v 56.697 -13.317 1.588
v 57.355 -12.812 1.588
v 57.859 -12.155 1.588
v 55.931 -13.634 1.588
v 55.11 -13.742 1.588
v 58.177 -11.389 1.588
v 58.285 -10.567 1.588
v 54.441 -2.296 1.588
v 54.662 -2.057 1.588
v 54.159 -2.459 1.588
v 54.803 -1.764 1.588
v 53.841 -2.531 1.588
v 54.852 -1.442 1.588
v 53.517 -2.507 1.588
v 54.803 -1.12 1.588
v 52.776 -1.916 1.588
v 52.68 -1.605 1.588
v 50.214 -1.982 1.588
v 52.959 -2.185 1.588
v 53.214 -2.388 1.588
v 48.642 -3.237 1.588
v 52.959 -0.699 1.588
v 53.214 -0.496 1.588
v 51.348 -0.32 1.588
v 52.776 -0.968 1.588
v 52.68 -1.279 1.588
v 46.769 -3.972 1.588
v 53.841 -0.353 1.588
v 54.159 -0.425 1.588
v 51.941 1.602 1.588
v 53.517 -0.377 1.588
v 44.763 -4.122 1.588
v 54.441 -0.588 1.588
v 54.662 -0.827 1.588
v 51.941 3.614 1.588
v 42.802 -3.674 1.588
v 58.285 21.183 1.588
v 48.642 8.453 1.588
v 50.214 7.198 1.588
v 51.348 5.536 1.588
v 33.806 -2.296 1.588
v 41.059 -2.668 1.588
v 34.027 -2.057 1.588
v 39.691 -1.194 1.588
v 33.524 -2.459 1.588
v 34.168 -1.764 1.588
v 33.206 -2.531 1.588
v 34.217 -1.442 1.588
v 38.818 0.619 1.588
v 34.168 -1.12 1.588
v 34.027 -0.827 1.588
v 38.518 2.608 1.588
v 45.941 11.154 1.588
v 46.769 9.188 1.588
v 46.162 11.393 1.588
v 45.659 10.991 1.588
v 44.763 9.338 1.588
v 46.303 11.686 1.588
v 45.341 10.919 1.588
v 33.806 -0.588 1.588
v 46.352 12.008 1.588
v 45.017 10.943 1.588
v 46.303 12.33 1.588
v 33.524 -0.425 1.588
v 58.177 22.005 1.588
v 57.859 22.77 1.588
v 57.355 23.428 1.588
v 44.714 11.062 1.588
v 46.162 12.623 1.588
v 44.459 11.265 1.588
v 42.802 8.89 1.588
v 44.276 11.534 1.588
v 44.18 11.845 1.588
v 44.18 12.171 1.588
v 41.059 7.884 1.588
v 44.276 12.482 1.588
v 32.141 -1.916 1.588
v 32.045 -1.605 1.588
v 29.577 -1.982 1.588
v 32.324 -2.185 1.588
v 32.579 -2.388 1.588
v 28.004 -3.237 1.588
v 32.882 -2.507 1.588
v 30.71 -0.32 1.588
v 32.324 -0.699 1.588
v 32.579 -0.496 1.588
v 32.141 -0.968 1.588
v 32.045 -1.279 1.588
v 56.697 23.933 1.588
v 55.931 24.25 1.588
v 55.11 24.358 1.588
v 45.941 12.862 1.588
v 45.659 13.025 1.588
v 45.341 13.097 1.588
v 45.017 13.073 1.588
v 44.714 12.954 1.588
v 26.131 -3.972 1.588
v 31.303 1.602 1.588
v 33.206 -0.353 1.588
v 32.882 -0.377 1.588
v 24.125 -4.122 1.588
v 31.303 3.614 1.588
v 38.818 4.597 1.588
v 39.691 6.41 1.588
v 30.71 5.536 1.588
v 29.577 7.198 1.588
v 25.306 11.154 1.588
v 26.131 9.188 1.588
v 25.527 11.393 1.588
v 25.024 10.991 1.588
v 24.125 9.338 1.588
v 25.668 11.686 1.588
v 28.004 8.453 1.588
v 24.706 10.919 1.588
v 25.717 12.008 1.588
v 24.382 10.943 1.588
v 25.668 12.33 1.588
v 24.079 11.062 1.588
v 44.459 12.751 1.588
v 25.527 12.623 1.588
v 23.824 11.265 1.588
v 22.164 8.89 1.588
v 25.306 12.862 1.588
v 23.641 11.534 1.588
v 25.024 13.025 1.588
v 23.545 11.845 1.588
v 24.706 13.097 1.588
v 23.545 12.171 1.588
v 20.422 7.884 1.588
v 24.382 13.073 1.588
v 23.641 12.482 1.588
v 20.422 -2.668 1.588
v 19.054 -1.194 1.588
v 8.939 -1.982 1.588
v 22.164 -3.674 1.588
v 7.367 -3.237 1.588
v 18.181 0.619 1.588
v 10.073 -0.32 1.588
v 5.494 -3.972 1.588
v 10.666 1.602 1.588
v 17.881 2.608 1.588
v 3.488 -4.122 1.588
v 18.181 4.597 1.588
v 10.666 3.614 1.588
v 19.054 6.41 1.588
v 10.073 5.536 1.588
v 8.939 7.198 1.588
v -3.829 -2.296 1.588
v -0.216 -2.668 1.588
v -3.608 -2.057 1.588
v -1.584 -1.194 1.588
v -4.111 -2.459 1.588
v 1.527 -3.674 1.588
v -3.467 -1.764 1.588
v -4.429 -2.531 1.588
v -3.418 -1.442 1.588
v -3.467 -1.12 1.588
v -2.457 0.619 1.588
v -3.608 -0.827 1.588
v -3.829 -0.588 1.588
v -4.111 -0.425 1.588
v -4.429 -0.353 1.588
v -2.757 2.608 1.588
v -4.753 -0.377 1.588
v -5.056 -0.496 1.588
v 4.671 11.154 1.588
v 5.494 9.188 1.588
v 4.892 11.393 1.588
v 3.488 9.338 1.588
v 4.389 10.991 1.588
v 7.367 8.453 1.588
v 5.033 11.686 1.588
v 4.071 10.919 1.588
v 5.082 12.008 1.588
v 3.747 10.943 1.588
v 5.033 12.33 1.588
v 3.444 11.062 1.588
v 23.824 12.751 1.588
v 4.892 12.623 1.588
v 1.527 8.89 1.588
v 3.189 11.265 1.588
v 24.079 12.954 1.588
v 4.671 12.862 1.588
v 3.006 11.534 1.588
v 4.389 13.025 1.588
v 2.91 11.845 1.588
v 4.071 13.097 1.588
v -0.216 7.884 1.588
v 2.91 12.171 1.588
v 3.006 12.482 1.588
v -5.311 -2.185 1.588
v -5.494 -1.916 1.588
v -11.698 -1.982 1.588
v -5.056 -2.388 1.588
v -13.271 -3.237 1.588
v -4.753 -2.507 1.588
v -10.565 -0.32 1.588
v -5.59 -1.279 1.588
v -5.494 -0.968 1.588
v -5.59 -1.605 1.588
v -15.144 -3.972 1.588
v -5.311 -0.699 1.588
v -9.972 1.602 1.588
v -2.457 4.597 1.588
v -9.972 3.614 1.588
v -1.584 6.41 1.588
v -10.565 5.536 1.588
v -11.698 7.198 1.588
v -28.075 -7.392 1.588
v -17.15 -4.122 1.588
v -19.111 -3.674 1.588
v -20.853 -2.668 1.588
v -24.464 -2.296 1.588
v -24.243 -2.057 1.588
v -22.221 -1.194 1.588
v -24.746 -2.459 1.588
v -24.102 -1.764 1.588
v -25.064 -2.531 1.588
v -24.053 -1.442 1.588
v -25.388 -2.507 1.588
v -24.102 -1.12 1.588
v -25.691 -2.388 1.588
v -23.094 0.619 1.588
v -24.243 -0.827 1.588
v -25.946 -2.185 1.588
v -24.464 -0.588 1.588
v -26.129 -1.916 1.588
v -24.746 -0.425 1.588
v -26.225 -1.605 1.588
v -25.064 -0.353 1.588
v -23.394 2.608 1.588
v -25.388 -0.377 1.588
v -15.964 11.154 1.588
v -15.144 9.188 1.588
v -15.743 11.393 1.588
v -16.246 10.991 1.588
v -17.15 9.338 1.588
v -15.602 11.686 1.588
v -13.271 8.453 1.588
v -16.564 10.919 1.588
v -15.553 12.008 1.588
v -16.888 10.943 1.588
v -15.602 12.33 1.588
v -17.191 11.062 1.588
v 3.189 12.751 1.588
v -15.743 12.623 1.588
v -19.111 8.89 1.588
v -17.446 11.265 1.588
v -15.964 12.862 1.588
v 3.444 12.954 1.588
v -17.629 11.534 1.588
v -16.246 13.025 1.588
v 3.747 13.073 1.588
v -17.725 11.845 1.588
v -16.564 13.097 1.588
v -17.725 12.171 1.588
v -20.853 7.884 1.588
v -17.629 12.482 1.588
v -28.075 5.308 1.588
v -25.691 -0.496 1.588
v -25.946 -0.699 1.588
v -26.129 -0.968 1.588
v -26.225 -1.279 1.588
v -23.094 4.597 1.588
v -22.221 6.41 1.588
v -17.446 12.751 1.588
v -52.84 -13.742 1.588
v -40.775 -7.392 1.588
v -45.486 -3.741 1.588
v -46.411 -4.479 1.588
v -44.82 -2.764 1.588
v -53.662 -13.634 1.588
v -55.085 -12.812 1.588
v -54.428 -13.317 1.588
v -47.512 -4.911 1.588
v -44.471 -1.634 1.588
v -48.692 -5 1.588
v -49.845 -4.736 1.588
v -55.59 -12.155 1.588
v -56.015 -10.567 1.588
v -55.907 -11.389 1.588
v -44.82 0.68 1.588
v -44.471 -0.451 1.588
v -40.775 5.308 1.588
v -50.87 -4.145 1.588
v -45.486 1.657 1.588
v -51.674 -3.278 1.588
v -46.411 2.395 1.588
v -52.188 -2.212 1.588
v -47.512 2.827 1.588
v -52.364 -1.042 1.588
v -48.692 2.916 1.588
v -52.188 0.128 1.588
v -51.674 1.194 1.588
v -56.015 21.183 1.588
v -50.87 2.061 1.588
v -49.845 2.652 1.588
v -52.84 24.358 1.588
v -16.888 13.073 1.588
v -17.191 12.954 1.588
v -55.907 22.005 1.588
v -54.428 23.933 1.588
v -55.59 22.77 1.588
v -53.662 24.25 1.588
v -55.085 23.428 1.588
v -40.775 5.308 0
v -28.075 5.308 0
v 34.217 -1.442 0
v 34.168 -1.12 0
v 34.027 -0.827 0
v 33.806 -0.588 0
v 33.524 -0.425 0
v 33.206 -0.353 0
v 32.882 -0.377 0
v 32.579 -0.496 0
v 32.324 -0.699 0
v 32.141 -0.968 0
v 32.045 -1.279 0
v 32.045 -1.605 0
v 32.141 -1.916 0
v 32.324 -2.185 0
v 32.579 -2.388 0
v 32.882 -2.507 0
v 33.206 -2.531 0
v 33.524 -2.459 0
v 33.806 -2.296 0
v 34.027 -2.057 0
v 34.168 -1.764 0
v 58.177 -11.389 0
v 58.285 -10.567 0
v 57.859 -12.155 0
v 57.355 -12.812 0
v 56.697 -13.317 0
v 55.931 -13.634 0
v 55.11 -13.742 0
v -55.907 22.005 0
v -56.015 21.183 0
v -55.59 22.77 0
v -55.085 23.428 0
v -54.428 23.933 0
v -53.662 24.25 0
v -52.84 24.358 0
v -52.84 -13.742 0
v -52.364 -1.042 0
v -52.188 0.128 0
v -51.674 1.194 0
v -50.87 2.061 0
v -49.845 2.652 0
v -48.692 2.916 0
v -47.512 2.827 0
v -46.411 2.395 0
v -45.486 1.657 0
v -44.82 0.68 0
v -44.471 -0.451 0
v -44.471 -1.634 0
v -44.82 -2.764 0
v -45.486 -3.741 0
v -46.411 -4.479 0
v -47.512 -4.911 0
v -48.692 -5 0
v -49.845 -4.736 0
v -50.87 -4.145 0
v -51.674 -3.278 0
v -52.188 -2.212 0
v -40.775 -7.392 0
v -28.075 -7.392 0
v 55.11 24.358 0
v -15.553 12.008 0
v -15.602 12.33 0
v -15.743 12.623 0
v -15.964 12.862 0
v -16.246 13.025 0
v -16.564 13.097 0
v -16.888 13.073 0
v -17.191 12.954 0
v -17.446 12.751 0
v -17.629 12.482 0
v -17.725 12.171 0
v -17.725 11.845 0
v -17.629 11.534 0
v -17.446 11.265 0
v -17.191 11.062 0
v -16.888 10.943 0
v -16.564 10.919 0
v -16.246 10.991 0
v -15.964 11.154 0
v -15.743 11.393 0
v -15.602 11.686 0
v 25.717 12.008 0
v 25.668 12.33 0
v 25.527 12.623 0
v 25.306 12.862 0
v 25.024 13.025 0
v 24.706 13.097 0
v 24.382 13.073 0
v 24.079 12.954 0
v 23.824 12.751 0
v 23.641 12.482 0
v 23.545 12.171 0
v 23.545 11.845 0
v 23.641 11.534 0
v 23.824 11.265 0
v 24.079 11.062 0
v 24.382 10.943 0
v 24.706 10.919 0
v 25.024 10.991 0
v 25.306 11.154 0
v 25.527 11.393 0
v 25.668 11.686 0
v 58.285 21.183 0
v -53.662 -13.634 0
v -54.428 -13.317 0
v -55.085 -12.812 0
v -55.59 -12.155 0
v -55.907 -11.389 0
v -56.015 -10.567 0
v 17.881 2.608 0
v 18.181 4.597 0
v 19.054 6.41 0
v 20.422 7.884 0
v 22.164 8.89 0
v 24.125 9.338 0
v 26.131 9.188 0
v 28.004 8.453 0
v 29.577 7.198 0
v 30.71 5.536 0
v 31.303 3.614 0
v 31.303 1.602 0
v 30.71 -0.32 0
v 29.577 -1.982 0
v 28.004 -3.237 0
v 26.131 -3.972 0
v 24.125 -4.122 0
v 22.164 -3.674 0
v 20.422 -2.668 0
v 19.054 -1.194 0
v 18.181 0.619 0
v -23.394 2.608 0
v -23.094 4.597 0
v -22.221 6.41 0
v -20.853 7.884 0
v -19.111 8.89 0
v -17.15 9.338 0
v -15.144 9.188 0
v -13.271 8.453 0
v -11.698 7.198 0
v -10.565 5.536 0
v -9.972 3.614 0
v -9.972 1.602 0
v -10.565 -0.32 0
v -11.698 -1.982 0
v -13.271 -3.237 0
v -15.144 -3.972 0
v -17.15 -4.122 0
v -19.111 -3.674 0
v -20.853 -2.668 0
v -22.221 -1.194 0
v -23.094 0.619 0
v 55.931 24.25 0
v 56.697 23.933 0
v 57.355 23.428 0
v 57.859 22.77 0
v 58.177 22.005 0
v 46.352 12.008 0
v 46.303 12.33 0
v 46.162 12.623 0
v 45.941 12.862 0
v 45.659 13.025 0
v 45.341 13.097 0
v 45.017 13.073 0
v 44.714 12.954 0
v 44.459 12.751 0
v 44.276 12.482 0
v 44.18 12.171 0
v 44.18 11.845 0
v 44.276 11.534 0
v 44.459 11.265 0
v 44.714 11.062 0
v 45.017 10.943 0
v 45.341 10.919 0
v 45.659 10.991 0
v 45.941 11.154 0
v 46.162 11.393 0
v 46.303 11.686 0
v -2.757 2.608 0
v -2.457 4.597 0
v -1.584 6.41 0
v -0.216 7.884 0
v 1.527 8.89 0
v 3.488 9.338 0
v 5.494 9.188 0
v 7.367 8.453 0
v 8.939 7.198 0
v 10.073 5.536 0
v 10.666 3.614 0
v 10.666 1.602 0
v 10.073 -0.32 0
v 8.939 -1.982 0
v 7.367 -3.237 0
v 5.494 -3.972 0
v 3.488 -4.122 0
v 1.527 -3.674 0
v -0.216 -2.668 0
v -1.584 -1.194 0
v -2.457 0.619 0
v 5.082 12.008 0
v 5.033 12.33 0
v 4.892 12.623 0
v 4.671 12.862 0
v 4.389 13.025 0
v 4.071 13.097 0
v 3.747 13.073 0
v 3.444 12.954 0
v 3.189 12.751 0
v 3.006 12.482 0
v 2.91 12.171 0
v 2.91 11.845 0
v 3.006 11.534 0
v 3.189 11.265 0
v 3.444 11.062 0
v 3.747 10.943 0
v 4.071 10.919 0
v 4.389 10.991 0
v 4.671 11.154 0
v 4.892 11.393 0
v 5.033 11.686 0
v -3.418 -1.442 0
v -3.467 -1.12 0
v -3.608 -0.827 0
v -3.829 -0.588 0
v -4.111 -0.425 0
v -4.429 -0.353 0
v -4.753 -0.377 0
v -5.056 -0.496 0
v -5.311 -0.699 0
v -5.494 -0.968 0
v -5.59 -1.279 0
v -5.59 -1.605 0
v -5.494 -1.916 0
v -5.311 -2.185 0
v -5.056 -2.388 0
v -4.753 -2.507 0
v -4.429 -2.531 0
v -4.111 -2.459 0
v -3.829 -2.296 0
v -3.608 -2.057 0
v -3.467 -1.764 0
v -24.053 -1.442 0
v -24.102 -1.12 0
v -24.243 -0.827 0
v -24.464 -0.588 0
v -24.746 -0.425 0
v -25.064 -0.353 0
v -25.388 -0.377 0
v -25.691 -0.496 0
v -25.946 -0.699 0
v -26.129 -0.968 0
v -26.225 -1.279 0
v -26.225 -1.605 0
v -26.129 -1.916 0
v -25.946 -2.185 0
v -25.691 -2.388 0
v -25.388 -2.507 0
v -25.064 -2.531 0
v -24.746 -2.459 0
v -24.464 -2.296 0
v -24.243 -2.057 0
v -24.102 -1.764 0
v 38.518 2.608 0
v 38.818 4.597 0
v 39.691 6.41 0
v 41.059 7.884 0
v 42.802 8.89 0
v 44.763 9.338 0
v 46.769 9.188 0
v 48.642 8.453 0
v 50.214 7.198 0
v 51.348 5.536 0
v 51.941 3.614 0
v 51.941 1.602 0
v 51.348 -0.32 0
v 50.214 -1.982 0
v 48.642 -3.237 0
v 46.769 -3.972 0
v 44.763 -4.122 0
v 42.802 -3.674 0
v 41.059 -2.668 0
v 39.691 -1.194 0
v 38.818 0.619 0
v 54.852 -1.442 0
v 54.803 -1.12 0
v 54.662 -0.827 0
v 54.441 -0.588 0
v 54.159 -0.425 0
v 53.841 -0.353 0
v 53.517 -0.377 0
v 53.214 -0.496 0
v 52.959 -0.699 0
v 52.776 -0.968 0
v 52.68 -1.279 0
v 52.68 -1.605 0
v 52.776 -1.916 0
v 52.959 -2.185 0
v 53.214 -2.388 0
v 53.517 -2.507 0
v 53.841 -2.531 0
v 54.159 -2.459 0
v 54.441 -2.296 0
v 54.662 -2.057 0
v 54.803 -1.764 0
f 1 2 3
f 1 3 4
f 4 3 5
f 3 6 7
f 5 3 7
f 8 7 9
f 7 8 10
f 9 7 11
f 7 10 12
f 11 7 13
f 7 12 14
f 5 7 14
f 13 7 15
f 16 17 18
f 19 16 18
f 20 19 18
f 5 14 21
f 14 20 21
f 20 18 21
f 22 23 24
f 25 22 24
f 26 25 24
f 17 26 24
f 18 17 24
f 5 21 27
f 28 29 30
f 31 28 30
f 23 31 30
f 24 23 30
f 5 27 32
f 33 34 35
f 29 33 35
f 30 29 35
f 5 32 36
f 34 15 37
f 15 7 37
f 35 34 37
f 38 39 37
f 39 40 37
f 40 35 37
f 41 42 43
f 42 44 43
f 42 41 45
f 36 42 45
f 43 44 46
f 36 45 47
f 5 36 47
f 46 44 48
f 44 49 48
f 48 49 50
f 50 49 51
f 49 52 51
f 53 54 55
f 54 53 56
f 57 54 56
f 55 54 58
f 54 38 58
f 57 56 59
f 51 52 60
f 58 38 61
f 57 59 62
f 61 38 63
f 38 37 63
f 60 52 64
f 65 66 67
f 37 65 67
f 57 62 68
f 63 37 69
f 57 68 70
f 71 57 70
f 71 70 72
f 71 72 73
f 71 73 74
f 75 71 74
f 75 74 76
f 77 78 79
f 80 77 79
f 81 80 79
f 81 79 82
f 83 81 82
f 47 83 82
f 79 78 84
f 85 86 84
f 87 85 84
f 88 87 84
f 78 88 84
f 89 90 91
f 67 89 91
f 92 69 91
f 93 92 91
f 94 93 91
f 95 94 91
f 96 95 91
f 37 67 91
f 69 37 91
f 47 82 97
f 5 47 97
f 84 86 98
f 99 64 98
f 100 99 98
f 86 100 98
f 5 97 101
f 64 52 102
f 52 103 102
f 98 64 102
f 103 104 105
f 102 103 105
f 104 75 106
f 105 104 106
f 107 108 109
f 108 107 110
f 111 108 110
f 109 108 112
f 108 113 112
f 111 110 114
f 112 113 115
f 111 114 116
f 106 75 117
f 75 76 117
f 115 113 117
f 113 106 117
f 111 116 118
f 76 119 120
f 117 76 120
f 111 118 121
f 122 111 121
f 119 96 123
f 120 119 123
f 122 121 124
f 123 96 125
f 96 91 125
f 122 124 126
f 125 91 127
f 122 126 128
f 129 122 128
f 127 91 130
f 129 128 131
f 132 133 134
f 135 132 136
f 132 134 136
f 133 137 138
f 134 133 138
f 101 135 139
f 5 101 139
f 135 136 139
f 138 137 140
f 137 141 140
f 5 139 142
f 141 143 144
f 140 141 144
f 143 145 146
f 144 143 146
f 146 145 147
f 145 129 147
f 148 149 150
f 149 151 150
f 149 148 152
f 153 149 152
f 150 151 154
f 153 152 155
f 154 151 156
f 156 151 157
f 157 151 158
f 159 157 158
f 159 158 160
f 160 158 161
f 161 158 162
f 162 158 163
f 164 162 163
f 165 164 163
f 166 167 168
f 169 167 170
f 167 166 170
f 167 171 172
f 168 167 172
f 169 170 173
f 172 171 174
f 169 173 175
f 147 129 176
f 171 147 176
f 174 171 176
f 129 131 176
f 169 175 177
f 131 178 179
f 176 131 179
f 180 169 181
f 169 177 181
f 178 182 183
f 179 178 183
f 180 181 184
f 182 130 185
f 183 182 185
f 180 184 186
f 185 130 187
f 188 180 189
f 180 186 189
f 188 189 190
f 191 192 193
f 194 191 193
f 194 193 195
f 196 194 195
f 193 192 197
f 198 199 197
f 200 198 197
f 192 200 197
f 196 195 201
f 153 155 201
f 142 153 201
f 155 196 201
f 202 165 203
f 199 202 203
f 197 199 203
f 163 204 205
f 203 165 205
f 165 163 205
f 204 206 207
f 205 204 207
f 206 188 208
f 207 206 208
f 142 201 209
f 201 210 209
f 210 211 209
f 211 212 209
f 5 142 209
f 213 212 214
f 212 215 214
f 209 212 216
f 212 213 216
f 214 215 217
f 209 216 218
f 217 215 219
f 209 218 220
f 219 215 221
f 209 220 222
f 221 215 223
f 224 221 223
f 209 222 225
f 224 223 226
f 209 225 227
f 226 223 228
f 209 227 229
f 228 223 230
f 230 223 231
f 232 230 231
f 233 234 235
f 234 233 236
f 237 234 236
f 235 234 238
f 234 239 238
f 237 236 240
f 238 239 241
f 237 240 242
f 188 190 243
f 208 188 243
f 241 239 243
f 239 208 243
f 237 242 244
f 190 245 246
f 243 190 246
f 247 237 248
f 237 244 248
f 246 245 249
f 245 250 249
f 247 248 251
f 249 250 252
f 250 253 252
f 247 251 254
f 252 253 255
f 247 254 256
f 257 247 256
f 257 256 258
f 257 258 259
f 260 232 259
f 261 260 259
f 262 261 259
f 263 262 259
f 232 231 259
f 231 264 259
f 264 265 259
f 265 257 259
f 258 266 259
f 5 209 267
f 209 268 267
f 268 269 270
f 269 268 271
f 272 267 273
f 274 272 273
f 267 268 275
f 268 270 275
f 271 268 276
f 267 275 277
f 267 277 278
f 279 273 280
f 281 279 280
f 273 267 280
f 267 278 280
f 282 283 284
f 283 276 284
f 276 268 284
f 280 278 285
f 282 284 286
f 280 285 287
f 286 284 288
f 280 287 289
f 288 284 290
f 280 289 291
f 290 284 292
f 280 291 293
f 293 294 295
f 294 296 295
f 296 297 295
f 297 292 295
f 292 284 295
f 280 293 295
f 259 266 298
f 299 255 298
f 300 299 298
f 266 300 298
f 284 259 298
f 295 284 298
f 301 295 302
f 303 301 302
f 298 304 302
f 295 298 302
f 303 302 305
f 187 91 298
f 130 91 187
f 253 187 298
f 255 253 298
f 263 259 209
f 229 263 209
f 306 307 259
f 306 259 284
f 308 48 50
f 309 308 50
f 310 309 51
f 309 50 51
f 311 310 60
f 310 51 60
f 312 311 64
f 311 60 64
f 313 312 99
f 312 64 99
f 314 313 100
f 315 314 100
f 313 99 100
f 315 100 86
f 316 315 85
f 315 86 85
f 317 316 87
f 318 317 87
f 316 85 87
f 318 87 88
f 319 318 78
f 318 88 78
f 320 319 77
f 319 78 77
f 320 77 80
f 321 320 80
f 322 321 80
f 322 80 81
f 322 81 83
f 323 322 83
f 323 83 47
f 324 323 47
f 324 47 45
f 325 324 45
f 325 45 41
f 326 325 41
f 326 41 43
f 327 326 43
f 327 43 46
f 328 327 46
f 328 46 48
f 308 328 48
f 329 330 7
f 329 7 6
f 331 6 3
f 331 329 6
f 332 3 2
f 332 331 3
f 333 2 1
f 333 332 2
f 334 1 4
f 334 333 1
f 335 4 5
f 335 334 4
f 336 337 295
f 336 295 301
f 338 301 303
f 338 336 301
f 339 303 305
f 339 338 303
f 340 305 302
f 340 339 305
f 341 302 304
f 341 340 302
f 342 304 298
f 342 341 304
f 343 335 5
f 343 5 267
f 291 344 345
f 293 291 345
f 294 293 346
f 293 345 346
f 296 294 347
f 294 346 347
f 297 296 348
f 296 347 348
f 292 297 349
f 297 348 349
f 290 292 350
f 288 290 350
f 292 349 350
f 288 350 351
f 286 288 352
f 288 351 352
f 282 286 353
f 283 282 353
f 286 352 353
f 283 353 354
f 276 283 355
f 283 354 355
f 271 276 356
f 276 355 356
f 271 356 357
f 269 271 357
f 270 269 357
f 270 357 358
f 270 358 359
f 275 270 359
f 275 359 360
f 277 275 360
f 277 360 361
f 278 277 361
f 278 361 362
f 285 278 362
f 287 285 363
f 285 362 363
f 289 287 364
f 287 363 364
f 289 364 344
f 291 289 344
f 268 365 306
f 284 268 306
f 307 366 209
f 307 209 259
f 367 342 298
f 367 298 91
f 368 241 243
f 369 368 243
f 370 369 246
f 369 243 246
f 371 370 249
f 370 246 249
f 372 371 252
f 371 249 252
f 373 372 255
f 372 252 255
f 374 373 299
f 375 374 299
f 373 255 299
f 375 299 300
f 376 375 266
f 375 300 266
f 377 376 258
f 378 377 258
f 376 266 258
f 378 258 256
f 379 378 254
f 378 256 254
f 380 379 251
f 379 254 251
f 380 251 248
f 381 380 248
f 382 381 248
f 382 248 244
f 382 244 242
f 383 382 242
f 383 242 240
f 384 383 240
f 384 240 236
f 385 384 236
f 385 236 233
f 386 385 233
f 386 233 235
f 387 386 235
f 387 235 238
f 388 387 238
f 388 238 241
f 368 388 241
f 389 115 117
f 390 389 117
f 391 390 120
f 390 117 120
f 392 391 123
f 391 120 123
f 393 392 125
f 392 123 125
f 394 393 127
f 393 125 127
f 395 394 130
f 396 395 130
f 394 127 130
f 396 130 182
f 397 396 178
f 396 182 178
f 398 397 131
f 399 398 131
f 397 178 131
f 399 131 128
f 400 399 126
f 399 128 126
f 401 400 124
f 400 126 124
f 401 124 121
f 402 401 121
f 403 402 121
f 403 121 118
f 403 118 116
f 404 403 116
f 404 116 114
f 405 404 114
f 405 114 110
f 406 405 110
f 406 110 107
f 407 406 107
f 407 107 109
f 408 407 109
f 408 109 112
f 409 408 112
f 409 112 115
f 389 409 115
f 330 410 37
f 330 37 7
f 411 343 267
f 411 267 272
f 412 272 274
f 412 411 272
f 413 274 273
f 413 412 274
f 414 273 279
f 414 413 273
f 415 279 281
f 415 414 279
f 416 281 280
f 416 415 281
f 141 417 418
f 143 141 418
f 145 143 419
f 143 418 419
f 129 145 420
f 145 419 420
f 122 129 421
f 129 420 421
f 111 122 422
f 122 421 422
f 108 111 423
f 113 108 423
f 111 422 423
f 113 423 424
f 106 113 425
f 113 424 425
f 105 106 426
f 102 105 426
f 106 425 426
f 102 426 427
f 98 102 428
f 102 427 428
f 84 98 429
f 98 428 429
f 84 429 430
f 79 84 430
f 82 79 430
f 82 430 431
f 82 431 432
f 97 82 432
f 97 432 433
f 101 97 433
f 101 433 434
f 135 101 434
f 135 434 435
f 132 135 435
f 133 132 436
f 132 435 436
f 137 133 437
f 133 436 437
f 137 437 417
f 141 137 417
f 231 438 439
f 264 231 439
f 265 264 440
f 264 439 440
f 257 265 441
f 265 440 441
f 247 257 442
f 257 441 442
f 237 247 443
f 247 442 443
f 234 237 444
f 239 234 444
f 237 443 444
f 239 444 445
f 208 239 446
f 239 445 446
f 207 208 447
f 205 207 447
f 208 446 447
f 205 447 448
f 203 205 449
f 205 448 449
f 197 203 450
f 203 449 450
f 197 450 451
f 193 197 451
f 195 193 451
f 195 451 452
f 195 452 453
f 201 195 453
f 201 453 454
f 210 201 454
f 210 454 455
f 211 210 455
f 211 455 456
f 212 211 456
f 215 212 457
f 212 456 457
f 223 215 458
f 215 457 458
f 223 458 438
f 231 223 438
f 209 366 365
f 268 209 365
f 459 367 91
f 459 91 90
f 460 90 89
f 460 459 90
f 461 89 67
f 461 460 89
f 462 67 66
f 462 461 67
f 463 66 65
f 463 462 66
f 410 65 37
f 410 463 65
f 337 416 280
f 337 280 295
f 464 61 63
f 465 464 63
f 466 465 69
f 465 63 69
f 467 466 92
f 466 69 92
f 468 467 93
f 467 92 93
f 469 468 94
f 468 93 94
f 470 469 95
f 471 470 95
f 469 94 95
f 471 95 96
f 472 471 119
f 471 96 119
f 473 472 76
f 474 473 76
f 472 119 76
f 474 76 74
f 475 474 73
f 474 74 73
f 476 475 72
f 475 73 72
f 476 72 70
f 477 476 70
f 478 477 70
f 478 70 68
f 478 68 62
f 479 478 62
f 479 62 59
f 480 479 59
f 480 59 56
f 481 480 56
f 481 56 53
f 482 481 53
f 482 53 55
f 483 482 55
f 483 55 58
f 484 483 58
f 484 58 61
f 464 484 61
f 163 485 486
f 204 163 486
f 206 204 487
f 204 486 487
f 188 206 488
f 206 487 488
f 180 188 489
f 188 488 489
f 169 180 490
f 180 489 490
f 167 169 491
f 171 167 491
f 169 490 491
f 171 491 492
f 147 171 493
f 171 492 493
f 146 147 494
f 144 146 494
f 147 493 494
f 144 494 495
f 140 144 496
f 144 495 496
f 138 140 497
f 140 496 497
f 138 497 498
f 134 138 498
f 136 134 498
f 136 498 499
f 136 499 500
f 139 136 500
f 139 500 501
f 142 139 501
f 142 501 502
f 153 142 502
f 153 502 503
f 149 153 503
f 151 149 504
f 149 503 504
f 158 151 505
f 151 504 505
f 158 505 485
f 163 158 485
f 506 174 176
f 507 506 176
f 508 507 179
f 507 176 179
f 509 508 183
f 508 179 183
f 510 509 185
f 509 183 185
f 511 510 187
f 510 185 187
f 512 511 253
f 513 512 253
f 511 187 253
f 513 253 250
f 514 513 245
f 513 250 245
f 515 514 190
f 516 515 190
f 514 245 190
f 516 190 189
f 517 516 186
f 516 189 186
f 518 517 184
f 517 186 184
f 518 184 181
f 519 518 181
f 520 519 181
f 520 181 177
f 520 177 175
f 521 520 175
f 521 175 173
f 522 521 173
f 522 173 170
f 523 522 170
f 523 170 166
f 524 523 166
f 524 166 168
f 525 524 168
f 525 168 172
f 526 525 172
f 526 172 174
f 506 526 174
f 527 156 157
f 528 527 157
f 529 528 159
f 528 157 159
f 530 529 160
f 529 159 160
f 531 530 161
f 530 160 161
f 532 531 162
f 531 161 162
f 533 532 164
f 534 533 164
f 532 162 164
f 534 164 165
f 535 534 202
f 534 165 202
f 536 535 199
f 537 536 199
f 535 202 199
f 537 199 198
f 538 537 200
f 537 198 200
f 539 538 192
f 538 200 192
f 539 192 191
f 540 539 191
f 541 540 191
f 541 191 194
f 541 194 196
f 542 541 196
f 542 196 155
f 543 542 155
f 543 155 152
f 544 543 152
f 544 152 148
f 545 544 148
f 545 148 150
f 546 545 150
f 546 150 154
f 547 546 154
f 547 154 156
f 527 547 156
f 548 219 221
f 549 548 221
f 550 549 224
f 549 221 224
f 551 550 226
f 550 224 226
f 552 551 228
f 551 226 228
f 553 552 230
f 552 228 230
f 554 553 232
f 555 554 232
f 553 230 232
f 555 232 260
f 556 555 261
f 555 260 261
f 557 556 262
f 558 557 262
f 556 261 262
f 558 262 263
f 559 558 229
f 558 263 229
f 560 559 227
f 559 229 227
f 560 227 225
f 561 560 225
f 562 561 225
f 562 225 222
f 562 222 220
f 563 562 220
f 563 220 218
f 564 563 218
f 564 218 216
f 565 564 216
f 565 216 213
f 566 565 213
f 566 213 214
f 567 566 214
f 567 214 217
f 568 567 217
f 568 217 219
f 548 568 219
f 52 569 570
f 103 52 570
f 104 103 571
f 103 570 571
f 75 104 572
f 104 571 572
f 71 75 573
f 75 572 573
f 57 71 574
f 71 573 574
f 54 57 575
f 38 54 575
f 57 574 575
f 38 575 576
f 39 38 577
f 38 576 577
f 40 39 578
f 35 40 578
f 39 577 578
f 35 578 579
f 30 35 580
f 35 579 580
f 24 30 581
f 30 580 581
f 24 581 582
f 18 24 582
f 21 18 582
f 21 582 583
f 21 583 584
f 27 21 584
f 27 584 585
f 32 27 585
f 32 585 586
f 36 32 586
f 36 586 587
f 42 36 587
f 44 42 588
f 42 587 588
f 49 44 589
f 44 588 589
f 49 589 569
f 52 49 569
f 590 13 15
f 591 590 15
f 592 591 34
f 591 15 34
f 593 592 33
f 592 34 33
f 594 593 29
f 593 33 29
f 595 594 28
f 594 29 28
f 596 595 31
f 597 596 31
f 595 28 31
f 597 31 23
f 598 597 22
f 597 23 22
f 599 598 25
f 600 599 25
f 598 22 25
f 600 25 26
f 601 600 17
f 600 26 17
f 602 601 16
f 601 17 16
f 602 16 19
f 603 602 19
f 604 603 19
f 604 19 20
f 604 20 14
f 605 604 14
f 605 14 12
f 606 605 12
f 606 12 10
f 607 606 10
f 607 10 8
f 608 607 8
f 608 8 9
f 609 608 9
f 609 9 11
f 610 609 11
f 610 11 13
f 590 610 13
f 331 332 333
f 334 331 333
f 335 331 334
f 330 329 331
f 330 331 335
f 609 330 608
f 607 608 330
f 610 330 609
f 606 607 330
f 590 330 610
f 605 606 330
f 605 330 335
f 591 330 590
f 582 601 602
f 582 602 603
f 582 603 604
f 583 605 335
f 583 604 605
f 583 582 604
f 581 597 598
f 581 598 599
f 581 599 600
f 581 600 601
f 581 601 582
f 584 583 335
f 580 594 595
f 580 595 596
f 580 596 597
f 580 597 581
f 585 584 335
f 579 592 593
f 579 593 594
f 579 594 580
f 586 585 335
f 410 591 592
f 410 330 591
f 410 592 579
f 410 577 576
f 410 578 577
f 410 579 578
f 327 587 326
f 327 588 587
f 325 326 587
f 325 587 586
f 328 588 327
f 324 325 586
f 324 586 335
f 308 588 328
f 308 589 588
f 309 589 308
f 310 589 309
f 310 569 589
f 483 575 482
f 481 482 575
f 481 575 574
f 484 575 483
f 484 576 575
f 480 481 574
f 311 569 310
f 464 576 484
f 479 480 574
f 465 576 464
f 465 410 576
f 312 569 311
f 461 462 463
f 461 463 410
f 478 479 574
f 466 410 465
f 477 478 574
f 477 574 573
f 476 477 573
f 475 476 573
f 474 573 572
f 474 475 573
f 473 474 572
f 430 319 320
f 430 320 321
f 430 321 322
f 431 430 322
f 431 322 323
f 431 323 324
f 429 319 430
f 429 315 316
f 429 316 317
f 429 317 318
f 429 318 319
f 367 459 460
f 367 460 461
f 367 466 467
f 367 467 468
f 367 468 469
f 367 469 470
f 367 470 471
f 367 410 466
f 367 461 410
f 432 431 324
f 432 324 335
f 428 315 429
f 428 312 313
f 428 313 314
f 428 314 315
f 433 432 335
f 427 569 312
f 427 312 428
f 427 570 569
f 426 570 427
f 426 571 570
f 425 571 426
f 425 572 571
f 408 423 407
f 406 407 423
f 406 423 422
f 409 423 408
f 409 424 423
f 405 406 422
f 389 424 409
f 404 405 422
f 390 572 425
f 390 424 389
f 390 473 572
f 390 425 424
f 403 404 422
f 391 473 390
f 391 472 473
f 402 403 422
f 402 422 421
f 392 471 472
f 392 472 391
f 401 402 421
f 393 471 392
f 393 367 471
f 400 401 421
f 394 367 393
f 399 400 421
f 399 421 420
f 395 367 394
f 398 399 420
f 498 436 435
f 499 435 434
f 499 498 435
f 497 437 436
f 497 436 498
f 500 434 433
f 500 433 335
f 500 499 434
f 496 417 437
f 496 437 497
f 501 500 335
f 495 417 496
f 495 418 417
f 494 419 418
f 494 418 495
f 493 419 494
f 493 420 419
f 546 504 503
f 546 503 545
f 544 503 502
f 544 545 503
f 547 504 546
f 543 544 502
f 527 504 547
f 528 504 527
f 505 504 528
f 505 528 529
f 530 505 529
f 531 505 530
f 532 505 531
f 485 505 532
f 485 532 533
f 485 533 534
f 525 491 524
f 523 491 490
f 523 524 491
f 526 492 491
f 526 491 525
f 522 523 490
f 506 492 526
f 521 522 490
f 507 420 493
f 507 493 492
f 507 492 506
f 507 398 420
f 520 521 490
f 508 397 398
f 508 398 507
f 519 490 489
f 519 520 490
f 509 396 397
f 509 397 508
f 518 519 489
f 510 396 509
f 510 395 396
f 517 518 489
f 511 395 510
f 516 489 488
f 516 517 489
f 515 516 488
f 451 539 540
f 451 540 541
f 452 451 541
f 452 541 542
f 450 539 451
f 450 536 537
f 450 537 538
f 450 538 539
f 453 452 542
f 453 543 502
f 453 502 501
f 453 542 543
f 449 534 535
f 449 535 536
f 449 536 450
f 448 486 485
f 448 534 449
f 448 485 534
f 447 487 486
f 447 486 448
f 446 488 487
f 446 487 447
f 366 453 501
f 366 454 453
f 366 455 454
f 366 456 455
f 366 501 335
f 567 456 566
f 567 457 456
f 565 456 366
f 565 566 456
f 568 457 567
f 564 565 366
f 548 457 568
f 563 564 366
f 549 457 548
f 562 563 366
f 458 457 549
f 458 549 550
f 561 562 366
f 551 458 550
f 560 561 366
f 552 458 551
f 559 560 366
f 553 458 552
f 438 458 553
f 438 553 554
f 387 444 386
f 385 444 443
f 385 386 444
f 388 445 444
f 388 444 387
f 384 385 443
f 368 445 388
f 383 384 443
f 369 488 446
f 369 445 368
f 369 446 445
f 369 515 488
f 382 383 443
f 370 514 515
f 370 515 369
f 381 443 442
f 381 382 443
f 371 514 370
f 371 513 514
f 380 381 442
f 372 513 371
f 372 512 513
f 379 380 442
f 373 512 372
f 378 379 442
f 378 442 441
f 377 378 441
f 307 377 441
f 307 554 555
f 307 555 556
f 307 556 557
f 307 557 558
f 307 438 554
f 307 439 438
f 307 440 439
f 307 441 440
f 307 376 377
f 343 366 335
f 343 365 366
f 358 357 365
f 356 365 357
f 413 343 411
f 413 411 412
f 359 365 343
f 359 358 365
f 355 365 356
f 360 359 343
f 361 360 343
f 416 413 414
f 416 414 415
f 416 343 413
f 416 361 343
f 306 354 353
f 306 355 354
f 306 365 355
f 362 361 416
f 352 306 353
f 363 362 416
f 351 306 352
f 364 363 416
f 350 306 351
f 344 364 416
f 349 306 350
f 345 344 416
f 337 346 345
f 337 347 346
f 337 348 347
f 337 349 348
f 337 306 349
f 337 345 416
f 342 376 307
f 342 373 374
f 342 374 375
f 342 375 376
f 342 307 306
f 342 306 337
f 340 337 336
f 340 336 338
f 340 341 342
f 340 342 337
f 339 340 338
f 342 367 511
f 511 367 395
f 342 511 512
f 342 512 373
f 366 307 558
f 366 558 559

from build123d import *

# Parameters (mm, degrees)
BOSS_EXTRUDE1_DEPTH = 1.5875
SKETCH2_R           = 6.74878
SKETCH2_R_2         = 3.96875
SKETCH2_W           = 12.7
SKETCH2_H           = 12.7
CUT_EXTRUDE1_DEPTH  = 1.5875
SKETCH3_R           = 1.0922
CUT_EXTRUDE2_DEPTH  = 64.189671282


with BuildPart() as part:
    # Sketch1 → Boss-Extrude1 (new body)
    with BuildSketch(Plane.XY):
        with BuildLine():
            Line((-52.840313991, 24.357951008), (55.109686009, 24.357951008))
            ThreePointArc((55.109686009, 24.357951008), (57.354750039, 23.428015038), (58.284686009, 21.182951008))
            Line((58.284686009, 21.182951008), (58.284686009, -10.567048992))
            ThreePointArc((58.284686009, -10.567048992), (57.354750039, -12.812113022), (55.109686009, -13.742048992))
            Line((55.109686009, -13.742048992), (-52.840313991, -13.742048992))
            ThreePointArc((-52.840313991, -13.742048992), (-55.085378022, -12.812113022), (-56.015313991, -10.567048992))
            Line((-56.015313991, -10.567048992), (-56.015313991, 21.182951008))
            ThreePointArc((-56.015313991, 21.182951008), (-55.085378022, 23.428015038), (-52.840313991, 24.357951008))
        make_face()
    extrude(amount=BOSS_EXTRUDE1_DEPTH)

    # Sketch2 → Cut-Extrude1 (cut)
    with BuildSketch(Plane(origin=(0, 0, 0), x_dir=(-1, 0, 0), z_dir=(0, 0, -1))):
        with Locations((16.645313991, 2.607931008)):
            Circle(SKETCH2_R)
        with Locations((-3.992186009, 2.607931008)):
            Circle(SKETCH2_R)
        with Locations((-24.629686009, 2.607931008)):
            Circle(SKETCH2_R)
        with Locations((-45.267186009, 2.607931008)):
            Circle(SKETCH2_R)
        with Locations((48.395313991, -1.042048992)):
            Circle(SKETCH2_R_2)
        with Locations((34.425313991, -1.042048992)):
            Rectangle(SKETCH2_W, SKETCH2_H)
    extrude(amount=-CUT_EXTRUDE1_DEPTH, mode=Mode.SUBTRACT)

    # Sketch3 → Cut-Extrude2 (cut, through all)
    with BuildSketch(Plane.XY.offset(1.5875)):
        with Locations((-16.645313991, 12.00793098)):
            Circle(SKETCH3_R)
        with Locations((3.989686009, 12.00793098)):
            Circle(SKETCH3_R)
        with Locations((24.624686009, 12.00793098)):
            Circle(SKETCH3_R)
        with Locations((-25.145314009, -1.44206902)):
            Circle(SKETCH3_R)
        with Locations((-4.510314009, -1.44206902)):
            Circle(SKETCH3_R)
        with Locations((33.124685991, -1.44206902)):
            Circle(SKETCH3_R)
        with Locations((45.259686009, 12.00793098)):
            Circle(SKETCH3_R)
        with Locations((53.759685991, -1.44206902)):
            Circle(SKETCH3_R)
    extrude(amount=-CUT_EXTRUDE2_DEPTH, mode=Mode.SUBTRACT)


solid = part.part
